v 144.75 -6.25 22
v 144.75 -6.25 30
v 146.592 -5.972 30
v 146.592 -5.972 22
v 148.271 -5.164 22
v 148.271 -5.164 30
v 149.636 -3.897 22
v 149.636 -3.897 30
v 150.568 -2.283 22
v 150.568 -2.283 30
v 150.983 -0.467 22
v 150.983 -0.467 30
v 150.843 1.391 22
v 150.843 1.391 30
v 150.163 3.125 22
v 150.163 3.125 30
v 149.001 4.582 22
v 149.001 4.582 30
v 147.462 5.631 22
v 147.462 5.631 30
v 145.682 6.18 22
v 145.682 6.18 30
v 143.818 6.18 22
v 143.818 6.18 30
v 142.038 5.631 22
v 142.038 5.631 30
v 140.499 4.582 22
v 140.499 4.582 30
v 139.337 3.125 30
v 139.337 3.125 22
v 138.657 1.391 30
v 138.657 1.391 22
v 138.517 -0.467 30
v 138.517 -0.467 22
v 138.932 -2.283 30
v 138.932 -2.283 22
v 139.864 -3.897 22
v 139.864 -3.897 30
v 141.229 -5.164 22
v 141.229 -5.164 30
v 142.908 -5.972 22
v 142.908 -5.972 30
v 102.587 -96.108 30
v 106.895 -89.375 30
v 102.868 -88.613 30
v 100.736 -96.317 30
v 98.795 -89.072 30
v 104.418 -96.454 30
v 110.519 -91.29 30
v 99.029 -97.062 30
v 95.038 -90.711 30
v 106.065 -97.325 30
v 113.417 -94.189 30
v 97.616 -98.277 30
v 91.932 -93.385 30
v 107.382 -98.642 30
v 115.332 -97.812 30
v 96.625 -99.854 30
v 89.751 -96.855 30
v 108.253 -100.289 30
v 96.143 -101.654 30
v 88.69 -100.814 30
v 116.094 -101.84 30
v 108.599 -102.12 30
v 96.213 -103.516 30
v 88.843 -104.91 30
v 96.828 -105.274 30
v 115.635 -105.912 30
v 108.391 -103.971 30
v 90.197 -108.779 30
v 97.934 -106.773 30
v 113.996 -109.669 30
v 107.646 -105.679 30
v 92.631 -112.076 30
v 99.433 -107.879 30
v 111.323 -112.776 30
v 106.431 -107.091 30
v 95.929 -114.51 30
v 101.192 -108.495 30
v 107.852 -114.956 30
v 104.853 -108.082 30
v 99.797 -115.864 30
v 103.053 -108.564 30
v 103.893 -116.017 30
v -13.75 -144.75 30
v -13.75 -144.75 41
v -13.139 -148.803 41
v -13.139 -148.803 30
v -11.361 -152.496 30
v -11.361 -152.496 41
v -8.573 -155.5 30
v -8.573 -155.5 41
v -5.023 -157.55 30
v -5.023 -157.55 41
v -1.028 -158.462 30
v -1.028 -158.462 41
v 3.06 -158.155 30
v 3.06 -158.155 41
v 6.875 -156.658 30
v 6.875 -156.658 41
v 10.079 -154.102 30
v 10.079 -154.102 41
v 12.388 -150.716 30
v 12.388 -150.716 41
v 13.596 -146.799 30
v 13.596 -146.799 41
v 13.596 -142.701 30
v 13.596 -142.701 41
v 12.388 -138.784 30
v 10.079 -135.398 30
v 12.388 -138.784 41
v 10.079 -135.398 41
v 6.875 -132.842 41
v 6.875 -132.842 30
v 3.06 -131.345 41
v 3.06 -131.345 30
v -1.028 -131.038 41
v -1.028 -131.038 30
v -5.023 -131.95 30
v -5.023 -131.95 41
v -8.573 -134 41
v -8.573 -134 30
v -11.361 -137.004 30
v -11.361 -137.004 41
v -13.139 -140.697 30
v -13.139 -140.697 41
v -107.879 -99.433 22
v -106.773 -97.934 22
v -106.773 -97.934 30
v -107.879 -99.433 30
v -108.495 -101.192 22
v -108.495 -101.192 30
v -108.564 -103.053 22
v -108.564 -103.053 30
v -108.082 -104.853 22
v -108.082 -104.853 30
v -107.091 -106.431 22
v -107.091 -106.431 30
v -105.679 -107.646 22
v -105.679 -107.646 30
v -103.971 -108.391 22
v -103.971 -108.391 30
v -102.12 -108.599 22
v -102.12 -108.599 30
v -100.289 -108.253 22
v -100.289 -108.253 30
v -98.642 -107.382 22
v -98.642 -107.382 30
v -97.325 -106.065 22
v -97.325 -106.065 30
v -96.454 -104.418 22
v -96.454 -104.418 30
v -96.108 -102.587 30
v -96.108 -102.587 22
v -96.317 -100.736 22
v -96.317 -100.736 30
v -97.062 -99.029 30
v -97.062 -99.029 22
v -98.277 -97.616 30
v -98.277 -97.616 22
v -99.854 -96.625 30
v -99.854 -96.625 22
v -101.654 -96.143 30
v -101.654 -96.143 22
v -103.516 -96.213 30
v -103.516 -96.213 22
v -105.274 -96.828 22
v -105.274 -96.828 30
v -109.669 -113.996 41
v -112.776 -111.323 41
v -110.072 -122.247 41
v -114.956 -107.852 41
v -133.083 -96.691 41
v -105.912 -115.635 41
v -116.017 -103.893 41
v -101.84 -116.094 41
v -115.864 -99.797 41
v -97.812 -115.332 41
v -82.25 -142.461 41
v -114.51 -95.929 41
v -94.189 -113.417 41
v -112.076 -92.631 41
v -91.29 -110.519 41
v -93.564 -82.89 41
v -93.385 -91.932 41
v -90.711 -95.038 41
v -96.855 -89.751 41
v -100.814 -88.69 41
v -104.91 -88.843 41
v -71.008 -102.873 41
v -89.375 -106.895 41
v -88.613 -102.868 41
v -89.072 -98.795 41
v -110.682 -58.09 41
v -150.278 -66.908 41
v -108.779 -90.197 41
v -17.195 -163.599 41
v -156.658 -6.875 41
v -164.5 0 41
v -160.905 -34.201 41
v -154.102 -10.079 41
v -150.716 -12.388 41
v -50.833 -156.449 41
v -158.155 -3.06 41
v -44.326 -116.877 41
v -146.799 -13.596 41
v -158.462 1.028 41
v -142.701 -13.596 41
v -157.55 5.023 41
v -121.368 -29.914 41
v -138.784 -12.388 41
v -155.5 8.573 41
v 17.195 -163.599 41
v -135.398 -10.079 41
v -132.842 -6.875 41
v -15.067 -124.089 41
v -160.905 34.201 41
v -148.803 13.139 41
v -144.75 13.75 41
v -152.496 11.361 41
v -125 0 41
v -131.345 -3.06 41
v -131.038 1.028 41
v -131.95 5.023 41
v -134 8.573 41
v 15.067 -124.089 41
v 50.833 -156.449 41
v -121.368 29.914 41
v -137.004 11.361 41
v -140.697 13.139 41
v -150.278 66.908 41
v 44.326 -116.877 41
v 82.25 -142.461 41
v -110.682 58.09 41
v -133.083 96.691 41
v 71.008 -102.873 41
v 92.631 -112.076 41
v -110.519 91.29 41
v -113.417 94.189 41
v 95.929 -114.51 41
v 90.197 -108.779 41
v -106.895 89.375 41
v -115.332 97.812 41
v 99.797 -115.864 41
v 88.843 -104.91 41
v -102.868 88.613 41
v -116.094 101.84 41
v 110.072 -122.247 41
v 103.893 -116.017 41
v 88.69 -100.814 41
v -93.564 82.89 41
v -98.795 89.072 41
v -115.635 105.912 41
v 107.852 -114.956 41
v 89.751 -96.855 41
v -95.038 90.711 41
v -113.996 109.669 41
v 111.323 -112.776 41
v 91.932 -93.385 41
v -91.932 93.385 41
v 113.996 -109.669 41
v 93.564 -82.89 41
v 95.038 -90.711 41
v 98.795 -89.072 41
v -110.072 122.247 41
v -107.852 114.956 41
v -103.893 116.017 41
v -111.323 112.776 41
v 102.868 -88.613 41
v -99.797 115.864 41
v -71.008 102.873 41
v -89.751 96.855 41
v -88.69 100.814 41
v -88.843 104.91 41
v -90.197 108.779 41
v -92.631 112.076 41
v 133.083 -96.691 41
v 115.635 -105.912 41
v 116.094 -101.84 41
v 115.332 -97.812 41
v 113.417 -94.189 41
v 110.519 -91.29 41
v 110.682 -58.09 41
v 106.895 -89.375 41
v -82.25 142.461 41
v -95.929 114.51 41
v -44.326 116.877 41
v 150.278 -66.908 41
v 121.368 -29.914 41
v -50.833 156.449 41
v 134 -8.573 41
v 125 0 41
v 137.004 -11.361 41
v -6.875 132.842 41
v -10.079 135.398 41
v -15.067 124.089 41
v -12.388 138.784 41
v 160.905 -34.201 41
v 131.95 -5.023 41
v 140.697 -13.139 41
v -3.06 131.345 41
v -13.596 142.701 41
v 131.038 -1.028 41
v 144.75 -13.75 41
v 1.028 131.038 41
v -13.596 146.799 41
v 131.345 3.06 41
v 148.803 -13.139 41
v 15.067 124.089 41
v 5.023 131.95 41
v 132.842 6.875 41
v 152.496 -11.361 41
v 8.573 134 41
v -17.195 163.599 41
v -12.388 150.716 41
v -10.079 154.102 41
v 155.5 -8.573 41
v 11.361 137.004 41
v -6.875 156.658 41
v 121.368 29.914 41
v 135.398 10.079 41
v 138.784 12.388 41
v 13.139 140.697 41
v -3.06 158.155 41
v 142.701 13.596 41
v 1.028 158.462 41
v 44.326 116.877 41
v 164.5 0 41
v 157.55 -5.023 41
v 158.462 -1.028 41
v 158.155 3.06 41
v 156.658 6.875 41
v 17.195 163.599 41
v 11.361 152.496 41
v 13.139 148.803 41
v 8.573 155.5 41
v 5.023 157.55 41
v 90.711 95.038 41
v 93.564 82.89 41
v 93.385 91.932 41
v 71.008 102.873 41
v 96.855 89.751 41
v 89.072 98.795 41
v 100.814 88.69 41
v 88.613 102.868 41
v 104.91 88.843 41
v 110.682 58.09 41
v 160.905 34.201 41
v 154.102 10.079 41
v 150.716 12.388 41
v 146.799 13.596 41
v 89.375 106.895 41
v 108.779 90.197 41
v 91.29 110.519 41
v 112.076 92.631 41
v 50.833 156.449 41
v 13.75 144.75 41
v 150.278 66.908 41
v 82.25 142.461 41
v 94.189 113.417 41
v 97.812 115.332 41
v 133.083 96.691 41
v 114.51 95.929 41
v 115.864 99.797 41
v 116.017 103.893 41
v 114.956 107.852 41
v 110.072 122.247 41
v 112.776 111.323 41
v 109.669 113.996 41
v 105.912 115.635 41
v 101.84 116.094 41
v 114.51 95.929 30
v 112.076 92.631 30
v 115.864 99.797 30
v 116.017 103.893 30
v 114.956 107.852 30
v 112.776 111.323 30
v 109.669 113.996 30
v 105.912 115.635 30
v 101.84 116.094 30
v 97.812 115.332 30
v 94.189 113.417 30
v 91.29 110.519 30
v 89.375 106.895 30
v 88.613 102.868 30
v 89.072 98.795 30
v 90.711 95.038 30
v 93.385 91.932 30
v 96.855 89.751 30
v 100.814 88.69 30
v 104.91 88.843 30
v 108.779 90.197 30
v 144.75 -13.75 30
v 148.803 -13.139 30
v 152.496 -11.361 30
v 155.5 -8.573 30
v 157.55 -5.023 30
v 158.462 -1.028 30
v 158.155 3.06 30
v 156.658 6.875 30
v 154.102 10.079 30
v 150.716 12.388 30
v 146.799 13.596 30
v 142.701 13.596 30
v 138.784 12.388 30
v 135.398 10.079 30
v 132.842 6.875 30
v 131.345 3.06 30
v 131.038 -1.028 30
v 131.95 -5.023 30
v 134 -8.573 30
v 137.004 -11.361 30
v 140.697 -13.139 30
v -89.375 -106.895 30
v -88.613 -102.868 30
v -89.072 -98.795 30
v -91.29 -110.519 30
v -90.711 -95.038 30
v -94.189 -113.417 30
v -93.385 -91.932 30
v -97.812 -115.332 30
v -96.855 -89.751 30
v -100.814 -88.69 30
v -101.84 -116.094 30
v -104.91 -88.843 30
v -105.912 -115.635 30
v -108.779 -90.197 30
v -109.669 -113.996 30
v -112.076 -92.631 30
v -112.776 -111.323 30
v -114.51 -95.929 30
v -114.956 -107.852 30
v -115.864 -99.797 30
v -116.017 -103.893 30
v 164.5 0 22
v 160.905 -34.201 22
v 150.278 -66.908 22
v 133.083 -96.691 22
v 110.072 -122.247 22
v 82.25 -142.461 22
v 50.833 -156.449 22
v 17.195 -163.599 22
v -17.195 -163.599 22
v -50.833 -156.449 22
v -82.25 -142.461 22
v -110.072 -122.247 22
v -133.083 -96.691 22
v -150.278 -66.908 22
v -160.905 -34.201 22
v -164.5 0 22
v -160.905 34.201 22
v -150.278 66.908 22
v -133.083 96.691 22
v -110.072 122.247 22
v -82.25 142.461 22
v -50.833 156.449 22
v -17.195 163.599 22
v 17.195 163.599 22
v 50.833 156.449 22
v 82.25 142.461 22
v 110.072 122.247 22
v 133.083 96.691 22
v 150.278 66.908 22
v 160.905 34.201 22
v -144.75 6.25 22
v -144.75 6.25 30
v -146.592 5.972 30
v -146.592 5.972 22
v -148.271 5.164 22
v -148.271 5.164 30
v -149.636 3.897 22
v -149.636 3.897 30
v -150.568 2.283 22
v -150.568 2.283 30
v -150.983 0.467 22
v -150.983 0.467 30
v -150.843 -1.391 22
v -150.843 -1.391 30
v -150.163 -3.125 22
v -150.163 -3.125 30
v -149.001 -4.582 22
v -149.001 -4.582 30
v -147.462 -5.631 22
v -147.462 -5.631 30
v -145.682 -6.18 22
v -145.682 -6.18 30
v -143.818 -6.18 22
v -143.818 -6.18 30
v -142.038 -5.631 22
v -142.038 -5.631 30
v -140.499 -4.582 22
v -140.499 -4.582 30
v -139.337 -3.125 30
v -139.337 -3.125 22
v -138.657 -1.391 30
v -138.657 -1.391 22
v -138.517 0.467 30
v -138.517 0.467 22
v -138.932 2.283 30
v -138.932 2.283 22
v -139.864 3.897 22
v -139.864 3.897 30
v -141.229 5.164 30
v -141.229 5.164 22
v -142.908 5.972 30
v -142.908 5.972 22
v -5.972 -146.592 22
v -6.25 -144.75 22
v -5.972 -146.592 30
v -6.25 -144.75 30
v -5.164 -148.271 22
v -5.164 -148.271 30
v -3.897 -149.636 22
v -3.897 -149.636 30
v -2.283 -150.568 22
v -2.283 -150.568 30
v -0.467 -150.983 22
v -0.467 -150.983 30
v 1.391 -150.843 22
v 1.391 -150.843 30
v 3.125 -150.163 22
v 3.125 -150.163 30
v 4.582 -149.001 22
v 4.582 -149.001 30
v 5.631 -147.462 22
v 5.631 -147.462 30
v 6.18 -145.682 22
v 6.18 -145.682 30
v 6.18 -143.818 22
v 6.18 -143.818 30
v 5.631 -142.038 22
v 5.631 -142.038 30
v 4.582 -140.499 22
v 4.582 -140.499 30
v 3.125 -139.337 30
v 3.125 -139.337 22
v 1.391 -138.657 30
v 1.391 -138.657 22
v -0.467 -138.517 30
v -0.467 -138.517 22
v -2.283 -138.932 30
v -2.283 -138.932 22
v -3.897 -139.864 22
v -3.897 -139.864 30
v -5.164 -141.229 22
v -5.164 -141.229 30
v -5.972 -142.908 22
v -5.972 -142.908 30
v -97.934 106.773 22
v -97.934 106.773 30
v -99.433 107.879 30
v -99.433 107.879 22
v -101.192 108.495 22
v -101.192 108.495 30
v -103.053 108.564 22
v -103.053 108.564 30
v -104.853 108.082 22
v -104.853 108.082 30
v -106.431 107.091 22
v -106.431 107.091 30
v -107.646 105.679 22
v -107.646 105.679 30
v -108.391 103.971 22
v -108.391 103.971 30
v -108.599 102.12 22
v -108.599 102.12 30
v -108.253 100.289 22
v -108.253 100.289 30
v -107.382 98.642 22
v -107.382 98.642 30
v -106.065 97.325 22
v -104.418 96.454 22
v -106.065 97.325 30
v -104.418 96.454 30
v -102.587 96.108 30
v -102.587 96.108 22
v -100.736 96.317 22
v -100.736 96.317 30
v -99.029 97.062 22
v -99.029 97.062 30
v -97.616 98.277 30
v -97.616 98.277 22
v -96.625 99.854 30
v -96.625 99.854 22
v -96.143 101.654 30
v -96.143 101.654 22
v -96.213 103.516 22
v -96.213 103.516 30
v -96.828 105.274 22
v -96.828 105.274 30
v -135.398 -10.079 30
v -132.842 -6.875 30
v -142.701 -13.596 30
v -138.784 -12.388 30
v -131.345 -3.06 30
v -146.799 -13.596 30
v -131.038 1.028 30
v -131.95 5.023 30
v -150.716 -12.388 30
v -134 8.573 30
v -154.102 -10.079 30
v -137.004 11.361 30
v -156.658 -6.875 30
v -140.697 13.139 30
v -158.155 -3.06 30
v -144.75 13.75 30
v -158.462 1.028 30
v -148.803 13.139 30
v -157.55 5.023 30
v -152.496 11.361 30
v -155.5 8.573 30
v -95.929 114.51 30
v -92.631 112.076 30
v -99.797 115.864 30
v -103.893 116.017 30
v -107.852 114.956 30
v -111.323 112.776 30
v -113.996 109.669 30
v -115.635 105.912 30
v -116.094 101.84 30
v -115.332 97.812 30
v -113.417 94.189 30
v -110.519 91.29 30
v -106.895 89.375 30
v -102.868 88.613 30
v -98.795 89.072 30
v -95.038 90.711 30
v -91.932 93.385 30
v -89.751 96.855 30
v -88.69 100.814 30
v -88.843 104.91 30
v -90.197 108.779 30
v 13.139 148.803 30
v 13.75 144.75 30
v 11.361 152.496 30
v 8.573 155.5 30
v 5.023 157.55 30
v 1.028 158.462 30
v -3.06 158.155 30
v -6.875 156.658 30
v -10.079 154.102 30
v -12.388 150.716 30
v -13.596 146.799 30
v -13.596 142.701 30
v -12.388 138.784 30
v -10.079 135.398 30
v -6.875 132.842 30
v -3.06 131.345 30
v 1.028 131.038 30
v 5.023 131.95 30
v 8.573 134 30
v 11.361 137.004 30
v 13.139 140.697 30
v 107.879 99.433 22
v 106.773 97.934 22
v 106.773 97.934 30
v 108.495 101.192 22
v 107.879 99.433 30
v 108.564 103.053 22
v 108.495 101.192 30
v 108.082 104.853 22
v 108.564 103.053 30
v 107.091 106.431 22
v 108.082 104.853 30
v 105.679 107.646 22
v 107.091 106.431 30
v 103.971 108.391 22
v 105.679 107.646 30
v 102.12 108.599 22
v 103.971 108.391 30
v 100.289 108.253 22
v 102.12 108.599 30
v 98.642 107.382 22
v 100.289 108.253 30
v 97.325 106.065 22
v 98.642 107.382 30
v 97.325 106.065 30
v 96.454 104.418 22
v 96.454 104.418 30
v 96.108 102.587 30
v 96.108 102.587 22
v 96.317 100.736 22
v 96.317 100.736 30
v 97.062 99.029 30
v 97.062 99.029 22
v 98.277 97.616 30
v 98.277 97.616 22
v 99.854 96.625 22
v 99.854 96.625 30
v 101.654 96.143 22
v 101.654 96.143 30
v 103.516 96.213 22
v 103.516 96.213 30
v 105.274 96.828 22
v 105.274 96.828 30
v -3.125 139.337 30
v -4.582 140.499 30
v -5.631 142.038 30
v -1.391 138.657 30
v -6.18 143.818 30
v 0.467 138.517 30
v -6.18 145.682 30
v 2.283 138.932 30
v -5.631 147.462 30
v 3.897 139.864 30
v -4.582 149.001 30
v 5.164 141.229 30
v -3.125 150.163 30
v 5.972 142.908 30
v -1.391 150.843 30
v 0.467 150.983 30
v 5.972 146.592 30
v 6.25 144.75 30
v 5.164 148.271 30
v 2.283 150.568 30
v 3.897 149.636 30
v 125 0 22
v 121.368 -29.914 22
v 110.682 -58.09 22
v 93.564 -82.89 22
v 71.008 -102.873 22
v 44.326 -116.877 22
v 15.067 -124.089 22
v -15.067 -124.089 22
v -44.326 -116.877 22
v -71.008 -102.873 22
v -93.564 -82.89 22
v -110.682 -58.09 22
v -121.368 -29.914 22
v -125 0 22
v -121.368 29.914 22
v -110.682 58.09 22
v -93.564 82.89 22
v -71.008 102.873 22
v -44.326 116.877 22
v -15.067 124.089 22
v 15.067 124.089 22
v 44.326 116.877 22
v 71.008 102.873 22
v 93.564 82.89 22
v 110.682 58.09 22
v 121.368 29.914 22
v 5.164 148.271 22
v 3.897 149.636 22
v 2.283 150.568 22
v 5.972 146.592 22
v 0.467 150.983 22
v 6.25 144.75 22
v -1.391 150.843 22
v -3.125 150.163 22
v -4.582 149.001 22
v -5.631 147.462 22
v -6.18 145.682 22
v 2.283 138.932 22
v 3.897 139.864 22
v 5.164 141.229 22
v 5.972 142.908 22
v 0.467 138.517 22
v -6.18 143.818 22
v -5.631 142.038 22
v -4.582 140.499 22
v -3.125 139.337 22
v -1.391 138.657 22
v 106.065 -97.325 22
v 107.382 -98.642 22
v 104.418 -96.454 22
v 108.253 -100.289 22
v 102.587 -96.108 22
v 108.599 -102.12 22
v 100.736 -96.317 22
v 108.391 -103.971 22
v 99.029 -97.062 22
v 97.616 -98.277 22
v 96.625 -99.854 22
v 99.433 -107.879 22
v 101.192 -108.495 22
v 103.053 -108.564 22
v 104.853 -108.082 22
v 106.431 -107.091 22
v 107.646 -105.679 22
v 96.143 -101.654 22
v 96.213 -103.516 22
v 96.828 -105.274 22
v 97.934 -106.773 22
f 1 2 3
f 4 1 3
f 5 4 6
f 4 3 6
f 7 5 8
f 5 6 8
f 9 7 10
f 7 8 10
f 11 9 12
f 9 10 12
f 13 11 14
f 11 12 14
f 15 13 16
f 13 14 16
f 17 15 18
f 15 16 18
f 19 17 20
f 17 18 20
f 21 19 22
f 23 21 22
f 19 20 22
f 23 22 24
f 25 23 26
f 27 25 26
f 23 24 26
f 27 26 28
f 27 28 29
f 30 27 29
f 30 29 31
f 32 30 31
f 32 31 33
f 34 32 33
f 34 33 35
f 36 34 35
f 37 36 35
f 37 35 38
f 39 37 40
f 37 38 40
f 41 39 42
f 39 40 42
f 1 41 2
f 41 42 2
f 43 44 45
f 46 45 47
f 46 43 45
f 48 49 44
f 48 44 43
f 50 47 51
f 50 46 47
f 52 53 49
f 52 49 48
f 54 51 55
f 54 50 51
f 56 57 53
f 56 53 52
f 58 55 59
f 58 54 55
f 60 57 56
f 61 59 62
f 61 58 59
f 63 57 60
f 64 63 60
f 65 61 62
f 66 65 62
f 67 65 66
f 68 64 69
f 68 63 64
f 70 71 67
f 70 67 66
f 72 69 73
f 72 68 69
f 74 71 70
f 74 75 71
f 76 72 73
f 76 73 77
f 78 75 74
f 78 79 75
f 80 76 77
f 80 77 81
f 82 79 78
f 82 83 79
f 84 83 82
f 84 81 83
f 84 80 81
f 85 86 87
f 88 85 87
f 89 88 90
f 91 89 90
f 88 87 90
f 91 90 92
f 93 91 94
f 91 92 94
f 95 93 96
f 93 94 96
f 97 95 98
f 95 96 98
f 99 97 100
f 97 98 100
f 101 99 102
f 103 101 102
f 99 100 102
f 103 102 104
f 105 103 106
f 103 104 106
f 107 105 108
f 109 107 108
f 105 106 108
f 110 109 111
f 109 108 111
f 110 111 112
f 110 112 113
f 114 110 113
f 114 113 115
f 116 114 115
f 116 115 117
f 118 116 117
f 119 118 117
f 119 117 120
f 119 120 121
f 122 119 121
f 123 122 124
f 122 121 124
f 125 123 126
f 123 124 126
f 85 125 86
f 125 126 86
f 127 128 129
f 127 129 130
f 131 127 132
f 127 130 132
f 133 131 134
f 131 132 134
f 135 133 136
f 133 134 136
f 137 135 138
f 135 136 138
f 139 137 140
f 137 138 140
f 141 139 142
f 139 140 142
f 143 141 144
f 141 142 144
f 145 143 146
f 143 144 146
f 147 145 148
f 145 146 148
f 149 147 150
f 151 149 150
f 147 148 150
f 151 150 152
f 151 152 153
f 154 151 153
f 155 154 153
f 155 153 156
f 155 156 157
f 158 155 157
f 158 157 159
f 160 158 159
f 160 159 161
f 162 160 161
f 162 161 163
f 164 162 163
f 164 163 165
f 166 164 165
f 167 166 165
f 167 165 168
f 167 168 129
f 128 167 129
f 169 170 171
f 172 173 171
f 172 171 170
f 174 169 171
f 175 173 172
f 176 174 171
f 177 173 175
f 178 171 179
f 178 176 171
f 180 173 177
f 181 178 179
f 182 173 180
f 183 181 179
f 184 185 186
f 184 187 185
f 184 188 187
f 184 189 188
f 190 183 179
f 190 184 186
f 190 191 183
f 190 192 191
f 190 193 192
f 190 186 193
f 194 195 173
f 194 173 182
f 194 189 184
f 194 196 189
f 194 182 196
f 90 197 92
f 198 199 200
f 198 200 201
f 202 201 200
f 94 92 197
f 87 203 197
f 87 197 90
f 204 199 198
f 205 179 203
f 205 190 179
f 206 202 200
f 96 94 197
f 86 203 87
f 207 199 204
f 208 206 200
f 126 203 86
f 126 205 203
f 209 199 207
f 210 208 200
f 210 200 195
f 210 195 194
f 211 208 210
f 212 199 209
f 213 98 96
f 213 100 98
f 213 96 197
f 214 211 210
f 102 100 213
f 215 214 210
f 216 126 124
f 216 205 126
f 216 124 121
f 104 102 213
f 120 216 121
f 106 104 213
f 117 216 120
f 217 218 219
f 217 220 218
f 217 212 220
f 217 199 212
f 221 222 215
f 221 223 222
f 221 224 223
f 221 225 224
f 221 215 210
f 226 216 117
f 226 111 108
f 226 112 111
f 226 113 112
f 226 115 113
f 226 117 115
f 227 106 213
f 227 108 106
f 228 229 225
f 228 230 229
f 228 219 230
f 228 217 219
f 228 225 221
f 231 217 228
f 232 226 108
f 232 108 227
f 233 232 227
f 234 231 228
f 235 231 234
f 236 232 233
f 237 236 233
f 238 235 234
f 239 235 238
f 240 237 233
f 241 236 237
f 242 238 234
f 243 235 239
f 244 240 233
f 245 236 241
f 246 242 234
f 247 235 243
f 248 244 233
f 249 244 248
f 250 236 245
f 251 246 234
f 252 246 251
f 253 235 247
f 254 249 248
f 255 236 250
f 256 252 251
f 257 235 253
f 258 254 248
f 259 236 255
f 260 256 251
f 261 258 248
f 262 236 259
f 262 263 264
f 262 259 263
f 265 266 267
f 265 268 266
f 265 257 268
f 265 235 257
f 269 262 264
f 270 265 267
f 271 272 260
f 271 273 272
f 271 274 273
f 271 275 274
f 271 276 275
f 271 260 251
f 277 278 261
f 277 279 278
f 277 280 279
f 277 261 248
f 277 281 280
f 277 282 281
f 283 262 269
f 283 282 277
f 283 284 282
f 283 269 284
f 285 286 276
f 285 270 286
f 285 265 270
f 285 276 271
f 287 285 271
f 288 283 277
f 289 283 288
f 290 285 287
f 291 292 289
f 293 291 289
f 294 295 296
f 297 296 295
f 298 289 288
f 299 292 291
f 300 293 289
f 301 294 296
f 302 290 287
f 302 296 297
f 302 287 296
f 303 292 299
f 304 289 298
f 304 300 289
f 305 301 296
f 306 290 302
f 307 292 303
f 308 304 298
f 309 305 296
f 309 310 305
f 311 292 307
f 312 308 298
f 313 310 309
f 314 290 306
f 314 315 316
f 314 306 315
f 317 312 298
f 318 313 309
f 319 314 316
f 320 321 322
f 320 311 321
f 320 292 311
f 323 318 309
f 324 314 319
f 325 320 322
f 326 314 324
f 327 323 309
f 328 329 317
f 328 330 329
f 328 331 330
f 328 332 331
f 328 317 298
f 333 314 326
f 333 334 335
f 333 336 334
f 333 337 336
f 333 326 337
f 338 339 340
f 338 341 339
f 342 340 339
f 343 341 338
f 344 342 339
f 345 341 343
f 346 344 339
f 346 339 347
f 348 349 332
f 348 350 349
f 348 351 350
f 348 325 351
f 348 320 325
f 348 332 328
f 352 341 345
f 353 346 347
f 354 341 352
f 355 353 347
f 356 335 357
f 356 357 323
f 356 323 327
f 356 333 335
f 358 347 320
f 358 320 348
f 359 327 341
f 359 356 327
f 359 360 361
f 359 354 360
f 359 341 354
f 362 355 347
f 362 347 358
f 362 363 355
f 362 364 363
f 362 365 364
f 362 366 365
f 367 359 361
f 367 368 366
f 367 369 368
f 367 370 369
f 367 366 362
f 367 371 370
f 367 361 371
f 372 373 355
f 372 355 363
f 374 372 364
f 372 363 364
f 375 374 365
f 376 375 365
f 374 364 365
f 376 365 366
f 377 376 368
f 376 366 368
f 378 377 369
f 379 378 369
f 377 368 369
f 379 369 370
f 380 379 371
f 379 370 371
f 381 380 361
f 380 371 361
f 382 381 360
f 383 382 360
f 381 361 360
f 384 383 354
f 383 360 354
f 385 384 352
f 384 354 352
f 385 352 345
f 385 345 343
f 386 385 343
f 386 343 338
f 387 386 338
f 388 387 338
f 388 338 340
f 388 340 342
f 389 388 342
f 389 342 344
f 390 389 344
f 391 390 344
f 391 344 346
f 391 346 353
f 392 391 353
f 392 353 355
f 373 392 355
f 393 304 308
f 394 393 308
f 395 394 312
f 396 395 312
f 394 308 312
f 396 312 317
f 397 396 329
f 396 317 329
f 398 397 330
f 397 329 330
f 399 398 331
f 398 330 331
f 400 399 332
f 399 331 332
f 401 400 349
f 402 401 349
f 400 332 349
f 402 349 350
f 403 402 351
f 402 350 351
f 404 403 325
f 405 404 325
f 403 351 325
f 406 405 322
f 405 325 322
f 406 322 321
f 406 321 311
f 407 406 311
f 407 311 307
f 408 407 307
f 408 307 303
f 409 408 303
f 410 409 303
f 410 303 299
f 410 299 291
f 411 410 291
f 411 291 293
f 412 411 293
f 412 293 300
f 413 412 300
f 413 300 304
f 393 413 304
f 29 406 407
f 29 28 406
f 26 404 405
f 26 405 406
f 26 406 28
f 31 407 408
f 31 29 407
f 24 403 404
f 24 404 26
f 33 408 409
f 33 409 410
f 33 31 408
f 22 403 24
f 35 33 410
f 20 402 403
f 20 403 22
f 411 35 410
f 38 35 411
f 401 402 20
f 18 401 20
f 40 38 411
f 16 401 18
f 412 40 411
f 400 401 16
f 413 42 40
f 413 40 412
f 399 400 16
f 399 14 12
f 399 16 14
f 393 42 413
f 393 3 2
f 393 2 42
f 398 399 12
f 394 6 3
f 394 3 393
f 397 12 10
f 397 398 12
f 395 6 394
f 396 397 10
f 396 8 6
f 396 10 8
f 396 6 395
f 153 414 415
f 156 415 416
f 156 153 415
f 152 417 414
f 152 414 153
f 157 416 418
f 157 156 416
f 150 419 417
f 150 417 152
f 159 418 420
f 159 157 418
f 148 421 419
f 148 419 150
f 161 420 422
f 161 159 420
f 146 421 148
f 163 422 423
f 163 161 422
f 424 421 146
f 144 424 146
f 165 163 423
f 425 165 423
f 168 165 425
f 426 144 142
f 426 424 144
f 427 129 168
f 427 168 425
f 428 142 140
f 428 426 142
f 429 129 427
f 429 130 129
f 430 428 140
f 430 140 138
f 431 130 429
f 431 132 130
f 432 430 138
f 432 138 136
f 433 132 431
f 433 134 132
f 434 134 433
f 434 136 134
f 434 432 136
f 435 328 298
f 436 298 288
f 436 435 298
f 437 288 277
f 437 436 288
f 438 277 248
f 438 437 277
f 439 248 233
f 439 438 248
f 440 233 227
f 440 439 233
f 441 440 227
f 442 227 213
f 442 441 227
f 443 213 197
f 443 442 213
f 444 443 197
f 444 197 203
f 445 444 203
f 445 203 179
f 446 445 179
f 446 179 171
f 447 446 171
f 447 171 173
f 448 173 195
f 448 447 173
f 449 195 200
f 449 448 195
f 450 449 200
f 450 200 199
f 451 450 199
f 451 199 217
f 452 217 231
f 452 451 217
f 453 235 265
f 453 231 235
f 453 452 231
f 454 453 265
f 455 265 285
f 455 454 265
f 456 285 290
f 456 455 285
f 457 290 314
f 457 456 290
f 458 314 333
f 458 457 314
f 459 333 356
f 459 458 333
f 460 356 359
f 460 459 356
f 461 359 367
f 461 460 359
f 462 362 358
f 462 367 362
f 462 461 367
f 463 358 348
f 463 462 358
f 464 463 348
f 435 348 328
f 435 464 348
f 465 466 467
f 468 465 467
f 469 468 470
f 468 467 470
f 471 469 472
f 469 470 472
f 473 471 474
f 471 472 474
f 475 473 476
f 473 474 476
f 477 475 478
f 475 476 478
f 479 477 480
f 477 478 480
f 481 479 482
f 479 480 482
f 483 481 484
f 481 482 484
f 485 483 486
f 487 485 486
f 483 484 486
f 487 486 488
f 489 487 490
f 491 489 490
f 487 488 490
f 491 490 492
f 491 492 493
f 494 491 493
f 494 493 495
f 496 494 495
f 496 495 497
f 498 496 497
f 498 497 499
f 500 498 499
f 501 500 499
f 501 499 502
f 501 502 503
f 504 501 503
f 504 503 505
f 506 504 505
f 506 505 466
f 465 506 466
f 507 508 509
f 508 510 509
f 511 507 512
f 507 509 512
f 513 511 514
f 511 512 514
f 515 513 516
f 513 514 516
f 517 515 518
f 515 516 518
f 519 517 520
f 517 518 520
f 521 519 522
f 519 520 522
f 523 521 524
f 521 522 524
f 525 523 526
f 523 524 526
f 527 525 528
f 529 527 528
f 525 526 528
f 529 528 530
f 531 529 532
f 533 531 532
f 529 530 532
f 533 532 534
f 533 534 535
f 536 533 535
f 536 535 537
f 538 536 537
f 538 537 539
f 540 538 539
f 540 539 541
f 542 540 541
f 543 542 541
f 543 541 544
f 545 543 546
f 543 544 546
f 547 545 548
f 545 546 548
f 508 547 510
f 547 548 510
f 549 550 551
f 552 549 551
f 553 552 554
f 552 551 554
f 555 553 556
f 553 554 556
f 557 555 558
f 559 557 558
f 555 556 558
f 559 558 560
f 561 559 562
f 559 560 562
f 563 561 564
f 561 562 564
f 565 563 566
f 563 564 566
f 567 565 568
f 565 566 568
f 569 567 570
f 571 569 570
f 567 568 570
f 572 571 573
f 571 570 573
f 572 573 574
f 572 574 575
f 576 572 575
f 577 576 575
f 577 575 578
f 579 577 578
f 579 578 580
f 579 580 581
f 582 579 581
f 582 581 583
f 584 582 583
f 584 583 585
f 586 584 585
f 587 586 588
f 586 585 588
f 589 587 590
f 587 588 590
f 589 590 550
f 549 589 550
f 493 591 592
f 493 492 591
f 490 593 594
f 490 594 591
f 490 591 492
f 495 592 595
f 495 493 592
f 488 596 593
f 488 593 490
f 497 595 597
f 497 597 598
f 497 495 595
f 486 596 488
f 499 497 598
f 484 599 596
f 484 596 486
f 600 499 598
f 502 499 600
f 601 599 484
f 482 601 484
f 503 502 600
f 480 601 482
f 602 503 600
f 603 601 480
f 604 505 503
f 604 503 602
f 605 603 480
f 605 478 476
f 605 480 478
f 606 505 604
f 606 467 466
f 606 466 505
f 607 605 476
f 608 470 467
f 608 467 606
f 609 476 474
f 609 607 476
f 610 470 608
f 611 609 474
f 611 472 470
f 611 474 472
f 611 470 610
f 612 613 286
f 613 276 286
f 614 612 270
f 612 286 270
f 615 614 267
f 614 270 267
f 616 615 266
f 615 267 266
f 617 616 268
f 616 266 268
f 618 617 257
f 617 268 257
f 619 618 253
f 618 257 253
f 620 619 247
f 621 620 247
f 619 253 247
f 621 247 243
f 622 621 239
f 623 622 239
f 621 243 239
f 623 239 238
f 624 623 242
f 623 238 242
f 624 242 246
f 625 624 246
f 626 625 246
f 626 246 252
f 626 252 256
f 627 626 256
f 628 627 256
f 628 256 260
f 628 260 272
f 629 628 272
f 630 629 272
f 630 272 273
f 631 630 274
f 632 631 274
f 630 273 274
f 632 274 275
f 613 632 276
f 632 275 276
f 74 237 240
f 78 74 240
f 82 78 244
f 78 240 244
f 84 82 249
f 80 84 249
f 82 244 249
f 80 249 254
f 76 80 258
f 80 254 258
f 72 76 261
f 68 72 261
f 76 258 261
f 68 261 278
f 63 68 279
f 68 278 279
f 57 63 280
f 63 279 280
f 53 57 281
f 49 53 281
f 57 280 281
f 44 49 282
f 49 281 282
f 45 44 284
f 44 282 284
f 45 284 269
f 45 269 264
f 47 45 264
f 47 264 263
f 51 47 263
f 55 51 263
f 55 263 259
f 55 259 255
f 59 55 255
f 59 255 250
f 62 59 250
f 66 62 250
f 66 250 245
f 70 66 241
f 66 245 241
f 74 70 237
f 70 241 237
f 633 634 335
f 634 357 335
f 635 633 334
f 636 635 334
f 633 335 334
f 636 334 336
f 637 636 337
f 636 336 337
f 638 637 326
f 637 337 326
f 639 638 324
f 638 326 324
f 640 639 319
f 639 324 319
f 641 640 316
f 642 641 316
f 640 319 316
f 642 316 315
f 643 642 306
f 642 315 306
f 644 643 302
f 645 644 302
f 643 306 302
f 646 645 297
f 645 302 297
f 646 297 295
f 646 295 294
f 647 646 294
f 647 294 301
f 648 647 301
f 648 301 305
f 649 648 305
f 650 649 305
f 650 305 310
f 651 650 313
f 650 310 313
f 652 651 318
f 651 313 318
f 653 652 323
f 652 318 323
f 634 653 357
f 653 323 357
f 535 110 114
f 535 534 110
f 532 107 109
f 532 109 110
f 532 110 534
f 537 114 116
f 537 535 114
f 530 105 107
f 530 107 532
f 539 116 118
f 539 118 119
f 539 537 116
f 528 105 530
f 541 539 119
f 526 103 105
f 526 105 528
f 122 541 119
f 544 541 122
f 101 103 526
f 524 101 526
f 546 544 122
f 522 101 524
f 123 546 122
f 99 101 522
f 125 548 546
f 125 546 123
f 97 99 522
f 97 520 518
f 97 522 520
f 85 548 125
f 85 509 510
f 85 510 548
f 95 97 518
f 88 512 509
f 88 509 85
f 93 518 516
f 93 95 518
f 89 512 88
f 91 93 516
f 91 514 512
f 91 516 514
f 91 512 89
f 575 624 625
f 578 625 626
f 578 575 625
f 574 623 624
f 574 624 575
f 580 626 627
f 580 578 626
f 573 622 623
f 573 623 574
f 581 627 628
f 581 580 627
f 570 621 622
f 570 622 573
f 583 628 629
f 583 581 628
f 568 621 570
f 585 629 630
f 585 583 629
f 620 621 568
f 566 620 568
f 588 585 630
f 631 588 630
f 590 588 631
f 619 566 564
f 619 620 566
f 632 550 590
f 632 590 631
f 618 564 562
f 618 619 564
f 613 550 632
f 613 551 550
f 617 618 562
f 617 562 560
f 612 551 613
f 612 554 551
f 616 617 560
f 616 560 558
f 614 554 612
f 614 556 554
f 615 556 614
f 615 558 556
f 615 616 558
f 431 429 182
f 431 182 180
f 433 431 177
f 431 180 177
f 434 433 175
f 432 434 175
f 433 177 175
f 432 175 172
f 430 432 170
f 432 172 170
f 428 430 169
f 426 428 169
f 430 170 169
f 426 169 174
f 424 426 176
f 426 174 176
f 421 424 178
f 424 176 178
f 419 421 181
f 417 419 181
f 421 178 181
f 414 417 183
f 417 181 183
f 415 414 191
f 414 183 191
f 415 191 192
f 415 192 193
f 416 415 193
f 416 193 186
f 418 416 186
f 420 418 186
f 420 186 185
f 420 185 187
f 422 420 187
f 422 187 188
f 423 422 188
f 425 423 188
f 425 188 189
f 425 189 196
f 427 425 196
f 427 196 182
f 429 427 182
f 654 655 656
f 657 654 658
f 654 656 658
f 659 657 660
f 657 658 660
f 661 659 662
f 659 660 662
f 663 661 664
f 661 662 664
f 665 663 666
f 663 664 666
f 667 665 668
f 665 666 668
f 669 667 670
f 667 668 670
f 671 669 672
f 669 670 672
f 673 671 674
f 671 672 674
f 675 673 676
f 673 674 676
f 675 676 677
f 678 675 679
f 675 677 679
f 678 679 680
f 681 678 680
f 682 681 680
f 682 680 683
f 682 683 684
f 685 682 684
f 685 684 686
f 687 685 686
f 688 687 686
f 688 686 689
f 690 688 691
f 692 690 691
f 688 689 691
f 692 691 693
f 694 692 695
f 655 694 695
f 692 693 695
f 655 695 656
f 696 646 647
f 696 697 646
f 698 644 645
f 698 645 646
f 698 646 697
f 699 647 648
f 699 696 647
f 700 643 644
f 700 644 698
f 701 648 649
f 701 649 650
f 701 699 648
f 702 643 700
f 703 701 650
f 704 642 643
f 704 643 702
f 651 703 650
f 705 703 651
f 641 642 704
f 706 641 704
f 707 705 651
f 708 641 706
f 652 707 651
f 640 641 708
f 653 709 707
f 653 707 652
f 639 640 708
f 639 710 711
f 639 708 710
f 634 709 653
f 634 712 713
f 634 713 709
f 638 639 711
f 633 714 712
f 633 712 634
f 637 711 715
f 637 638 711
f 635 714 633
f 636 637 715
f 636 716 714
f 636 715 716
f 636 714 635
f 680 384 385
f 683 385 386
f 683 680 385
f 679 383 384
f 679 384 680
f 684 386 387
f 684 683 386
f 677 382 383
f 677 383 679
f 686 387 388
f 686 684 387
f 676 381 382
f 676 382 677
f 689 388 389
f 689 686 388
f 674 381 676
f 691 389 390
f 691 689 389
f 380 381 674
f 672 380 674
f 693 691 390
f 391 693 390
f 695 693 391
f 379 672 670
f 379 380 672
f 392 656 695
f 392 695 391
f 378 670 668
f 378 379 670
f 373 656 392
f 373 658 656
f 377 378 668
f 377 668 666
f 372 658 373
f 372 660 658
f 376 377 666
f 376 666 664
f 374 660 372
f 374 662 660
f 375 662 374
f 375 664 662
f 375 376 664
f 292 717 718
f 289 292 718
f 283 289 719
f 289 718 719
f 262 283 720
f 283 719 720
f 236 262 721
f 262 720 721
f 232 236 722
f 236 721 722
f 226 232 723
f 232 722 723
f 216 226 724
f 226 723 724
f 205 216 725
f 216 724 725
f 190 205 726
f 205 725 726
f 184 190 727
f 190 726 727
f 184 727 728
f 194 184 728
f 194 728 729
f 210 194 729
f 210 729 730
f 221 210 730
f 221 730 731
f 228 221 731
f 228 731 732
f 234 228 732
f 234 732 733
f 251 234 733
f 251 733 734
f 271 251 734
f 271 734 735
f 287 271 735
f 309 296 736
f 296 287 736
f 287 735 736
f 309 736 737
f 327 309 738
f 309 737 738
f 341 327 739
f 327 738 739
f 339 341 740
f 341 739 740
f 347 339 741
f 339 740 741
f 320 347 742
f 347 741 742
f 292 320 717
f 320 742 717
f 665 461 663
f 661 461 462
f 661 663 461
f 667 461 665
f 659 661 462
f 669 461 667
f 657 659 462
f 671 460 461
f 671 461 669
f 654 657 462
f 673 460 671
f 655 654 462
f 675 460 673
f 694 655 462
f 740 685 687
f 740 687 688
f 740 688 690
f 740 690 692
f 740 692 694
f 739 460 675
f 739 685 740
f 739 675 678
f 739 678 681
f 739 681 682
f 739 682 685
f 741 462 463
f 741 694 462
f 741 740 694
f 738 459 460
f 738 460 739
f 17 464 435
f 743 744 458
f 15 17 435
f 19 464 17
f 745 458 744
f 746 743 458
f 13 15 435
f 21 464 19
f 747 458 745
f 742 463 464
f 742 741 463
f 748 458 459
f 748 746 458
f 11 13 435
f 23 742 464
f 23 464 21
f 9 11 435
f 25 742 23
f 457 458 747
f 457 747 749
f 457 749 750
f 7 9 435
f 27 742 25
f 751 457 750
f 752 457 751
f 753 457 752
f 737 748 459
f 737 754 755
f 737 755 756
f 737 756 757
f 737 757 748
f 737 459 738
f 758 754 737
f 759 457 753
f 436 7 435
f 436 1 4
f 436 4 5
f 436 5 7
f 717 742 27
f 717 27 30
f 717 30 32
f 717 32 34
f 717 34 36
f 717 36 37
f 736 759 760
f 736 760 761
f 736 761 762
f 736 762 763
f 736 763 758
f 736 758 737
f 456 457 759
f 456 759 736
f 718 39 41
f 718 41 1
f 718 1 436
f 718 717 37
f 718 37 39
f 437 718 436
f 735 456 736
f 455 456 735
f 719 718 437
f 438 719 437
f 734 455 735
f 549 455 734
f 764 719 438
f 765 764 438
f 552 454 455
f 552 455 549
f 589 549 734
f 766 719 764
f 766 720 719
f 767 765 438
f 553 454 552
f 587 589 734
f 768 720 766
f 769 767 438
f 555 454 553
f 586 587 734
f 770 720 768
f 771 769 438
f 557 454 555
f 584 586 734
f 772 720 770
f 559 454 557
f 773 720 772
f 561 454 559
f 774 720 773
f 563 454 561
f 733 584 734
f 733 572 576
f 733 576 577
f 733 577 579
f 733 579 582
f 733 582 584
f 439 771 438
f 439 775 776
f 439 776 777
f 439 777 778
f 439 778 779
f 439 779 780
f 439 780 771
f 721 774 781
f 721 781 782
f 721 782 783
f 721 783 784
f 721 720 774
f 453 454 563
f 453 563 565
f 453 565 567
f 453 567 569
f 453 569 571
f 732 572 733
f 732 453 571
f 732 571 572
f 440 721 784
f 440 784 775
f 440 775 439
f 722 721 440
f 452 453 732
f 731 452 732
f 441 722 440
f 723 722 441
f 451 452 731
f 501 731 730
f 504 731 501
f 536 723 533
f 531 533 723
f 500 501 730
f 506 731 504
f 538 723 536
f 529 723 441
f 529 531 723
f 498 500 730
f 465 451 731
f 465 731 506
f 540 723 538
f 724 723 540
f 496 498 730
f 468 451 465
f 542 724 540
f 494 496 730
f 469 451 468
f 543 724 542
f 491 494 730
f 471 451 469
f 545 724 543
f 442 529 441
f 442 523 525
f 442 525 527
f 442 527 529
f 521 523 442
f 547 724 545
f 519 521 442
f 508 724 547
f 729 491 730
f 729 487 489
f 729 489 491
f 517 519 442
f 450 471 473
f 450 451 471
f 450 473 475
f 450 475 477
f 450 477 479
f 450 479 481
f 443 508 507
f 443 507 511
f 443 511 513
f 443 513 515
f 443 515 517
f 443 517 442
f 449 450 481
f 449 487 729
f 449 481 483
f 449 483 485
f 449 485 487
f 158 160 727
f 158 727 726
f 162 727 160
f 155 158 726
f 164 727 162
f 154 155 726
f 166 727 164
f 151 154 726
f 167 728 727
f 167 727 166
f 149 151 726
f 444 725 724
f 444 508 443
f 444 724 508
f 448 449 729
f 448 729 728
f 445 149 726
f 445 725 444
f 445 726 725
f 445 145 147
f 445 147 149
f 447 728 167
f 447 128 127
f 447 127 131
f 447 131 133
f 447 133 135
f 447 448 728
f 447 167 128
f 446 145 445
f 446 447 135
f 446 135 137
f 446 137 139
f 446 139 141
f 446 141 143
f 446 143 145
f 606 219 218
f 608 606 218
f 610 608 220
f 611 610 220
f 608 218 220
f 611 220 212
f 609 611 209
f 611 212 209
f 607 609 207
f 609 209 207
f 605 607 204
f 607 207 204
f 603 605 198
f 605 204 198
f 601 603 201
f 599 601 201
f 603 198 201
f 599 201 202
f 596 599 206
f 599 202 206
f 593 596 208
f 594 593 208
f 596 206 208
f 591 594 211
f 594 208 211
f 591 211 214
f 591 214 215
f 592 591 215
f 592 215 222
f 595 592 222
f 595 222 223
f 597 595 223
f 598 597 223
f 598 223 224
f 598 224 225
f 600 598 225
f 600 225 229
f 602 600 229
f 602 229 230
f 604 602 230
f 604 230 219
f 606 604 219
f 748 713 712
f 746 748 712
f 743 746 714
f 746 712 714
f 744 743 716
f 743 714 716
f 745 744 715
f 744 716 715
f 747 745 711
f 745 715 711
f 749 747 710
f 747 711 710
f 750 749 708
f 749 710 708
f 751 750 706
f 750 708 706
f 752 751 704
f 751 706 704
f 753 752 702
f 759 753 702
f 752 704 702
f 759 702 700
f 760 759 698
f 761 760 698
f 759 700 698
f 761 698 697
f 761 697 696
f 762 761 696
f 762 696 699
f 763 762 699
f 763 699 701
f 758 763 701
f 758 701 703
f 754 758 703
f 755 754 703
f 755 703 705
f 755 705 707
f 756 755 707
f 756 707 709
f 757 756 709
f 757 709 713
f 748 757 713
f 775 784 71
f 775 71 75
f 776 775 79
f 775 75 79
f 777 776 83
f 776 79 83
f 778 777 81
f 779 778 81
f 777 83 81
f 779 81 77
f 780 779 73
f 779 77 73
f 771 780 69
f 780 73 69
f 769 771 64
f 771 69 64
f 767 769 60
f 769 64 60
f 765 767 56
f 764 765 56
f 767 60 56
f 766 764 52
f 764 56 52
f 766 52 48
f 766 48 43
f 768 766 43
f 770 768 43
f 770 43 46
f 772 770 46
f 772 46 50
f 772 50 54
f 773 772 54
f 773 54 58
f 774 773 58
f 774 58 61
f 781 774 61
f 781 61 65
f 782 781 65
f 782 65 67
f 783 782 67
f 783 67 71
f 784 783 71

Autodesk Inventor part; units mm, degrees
ref_plane "YZ Plane" through (0, 0, 0) normal (1, 0, 0) x (0, 1, 0)
ref_plane "XZ Plane" through (0, 0, 0) normal (0, 1, 0) x (-1, 0, 0)
ref_plane "XY Plane" through (0, 0, 0) normal (0, 0, 1) x (1, 0, 0)
sketch "Sketch1" plane through (0, 0, 0) normal (0, 0, 1) x (1, 0, 0)
  circle A0 centre (0, 0) radius 125
  circle A1 centre (0, 0) radius 164.5
  dimension "d0" = 39.5
  dimension "d1" = 250
extrude "Extrusion1" add sketch "Sketch1" along normal blind 41
sketch "Sketch2" plane through (0, 0, 41) normal (0, 0, 1) x (1, 0, 0)
  circle A0 centre (0, 0) radius 164.5 construction
  circle A1 centre (0, 0) radius 125 construction
  line L0 (0, 164.5) -> (0, 125) construction
  circle A2 centre (0, 144.75) radius 6.25
  dimension "d4" = 12.5
extrude "Extrusion2" cut sketch "Sketch2" against normal through all
sketch "Sketch3" plane through (0, 0, 41) normal (0, 0, 1) x (1, 0, 0)
  circle A0 centre (0, 144.75) radius 6.25 projected
  circle A1 centre (0, 144.75) radius 13.75
  point P0 (0, 0)
  dimension "d10" = 27.5
extrude "Extrusion3" cut sketch "Sketch3" against normal blind 11
pattern_circular "Circular Pattern1" count 8 over 360 about axis through (0, 0, 0) along (0, 0, 1) of "Extrusion2", "Extrusion3"
sketch "Sketch4" plane through (0, 0, 0) normal (0, 0, -1) x (-1, 0, 0)
  circle A0 centre (0, 0) radius 164.5 projected
  circle A1 centre (0, 0) radius 169.5
  dimension "d13" = 5
extrude "Extrusion4" add sketch "Sketch4" against normal blind 10
sketch "Sketch5" plane through (0, 0, 0) normal (1, 0, 0) x (0, 1, 0)
  line L0 (164.5, 10) -> (-164.5, 10) projected
  line L1 (164.5, 41) -> (-164.5, 41) projected
  line L2 (169.5, 10) -> (-169.5, 10) projected
  line L3 (-169.5, 0) -> (169.5, 0) projected
  line L4 (164.5, 41) -> (164.5, 10)
  line L5 (164.5, 10) -> (164.5, 41) projected
  line L6 (169.5, 10) -> (169.5, 0)
  line L7 (169.5, 0) -> (169.5, 10) projected
  line L8 (-169.5, 0) -> (169.5, 0) projected
  line L9 (-169.5, 0) -> (-169.5, 10)
  line L10 (-169.5, 0) -> (-169.5, 10) projected
  line L11 (-164.5, 10) -> (-164.5, 41)
  line L12 (164.5, 22) -> (-164.5, 22)
  line L13 (-164.5, 10) -> (-164.5, 41) projected
  point P0 (0, 0)
  dimension "d17" = 22
extrude "Extrusion5" cut sketch "Sketch5" along normal through all both and the other way through all contours L2 L6 L3 L9 L0 | L0 L11 L12 L4
equation "\"d1\" = Вал_ось_диаметр_НОС"
equation "\"BendRadius\" = Thickness"
equation "\"BendReliefWidth\" = Thickness"
equation "\"BendReliefDepth\" = 0.5 * Thickness"
equation "\"CornerReliefSize\" = 4 * Thickness"
equation "\"MinimumRemnant\" = 2 * Thickness"
equation "\"TransitionRadius\" = BendRadius"
equation "\"JacobiRadiusSize\" = BendRadius"
equation "\"GapSize\" = Thickness"
equation "\"Вал_ось_диаметр_НОС\" = 250"
equation "\"Thickness\" = 19"
properties part number "ДМФ 01 31.2 Барабан Опорное кольцо НОС"
